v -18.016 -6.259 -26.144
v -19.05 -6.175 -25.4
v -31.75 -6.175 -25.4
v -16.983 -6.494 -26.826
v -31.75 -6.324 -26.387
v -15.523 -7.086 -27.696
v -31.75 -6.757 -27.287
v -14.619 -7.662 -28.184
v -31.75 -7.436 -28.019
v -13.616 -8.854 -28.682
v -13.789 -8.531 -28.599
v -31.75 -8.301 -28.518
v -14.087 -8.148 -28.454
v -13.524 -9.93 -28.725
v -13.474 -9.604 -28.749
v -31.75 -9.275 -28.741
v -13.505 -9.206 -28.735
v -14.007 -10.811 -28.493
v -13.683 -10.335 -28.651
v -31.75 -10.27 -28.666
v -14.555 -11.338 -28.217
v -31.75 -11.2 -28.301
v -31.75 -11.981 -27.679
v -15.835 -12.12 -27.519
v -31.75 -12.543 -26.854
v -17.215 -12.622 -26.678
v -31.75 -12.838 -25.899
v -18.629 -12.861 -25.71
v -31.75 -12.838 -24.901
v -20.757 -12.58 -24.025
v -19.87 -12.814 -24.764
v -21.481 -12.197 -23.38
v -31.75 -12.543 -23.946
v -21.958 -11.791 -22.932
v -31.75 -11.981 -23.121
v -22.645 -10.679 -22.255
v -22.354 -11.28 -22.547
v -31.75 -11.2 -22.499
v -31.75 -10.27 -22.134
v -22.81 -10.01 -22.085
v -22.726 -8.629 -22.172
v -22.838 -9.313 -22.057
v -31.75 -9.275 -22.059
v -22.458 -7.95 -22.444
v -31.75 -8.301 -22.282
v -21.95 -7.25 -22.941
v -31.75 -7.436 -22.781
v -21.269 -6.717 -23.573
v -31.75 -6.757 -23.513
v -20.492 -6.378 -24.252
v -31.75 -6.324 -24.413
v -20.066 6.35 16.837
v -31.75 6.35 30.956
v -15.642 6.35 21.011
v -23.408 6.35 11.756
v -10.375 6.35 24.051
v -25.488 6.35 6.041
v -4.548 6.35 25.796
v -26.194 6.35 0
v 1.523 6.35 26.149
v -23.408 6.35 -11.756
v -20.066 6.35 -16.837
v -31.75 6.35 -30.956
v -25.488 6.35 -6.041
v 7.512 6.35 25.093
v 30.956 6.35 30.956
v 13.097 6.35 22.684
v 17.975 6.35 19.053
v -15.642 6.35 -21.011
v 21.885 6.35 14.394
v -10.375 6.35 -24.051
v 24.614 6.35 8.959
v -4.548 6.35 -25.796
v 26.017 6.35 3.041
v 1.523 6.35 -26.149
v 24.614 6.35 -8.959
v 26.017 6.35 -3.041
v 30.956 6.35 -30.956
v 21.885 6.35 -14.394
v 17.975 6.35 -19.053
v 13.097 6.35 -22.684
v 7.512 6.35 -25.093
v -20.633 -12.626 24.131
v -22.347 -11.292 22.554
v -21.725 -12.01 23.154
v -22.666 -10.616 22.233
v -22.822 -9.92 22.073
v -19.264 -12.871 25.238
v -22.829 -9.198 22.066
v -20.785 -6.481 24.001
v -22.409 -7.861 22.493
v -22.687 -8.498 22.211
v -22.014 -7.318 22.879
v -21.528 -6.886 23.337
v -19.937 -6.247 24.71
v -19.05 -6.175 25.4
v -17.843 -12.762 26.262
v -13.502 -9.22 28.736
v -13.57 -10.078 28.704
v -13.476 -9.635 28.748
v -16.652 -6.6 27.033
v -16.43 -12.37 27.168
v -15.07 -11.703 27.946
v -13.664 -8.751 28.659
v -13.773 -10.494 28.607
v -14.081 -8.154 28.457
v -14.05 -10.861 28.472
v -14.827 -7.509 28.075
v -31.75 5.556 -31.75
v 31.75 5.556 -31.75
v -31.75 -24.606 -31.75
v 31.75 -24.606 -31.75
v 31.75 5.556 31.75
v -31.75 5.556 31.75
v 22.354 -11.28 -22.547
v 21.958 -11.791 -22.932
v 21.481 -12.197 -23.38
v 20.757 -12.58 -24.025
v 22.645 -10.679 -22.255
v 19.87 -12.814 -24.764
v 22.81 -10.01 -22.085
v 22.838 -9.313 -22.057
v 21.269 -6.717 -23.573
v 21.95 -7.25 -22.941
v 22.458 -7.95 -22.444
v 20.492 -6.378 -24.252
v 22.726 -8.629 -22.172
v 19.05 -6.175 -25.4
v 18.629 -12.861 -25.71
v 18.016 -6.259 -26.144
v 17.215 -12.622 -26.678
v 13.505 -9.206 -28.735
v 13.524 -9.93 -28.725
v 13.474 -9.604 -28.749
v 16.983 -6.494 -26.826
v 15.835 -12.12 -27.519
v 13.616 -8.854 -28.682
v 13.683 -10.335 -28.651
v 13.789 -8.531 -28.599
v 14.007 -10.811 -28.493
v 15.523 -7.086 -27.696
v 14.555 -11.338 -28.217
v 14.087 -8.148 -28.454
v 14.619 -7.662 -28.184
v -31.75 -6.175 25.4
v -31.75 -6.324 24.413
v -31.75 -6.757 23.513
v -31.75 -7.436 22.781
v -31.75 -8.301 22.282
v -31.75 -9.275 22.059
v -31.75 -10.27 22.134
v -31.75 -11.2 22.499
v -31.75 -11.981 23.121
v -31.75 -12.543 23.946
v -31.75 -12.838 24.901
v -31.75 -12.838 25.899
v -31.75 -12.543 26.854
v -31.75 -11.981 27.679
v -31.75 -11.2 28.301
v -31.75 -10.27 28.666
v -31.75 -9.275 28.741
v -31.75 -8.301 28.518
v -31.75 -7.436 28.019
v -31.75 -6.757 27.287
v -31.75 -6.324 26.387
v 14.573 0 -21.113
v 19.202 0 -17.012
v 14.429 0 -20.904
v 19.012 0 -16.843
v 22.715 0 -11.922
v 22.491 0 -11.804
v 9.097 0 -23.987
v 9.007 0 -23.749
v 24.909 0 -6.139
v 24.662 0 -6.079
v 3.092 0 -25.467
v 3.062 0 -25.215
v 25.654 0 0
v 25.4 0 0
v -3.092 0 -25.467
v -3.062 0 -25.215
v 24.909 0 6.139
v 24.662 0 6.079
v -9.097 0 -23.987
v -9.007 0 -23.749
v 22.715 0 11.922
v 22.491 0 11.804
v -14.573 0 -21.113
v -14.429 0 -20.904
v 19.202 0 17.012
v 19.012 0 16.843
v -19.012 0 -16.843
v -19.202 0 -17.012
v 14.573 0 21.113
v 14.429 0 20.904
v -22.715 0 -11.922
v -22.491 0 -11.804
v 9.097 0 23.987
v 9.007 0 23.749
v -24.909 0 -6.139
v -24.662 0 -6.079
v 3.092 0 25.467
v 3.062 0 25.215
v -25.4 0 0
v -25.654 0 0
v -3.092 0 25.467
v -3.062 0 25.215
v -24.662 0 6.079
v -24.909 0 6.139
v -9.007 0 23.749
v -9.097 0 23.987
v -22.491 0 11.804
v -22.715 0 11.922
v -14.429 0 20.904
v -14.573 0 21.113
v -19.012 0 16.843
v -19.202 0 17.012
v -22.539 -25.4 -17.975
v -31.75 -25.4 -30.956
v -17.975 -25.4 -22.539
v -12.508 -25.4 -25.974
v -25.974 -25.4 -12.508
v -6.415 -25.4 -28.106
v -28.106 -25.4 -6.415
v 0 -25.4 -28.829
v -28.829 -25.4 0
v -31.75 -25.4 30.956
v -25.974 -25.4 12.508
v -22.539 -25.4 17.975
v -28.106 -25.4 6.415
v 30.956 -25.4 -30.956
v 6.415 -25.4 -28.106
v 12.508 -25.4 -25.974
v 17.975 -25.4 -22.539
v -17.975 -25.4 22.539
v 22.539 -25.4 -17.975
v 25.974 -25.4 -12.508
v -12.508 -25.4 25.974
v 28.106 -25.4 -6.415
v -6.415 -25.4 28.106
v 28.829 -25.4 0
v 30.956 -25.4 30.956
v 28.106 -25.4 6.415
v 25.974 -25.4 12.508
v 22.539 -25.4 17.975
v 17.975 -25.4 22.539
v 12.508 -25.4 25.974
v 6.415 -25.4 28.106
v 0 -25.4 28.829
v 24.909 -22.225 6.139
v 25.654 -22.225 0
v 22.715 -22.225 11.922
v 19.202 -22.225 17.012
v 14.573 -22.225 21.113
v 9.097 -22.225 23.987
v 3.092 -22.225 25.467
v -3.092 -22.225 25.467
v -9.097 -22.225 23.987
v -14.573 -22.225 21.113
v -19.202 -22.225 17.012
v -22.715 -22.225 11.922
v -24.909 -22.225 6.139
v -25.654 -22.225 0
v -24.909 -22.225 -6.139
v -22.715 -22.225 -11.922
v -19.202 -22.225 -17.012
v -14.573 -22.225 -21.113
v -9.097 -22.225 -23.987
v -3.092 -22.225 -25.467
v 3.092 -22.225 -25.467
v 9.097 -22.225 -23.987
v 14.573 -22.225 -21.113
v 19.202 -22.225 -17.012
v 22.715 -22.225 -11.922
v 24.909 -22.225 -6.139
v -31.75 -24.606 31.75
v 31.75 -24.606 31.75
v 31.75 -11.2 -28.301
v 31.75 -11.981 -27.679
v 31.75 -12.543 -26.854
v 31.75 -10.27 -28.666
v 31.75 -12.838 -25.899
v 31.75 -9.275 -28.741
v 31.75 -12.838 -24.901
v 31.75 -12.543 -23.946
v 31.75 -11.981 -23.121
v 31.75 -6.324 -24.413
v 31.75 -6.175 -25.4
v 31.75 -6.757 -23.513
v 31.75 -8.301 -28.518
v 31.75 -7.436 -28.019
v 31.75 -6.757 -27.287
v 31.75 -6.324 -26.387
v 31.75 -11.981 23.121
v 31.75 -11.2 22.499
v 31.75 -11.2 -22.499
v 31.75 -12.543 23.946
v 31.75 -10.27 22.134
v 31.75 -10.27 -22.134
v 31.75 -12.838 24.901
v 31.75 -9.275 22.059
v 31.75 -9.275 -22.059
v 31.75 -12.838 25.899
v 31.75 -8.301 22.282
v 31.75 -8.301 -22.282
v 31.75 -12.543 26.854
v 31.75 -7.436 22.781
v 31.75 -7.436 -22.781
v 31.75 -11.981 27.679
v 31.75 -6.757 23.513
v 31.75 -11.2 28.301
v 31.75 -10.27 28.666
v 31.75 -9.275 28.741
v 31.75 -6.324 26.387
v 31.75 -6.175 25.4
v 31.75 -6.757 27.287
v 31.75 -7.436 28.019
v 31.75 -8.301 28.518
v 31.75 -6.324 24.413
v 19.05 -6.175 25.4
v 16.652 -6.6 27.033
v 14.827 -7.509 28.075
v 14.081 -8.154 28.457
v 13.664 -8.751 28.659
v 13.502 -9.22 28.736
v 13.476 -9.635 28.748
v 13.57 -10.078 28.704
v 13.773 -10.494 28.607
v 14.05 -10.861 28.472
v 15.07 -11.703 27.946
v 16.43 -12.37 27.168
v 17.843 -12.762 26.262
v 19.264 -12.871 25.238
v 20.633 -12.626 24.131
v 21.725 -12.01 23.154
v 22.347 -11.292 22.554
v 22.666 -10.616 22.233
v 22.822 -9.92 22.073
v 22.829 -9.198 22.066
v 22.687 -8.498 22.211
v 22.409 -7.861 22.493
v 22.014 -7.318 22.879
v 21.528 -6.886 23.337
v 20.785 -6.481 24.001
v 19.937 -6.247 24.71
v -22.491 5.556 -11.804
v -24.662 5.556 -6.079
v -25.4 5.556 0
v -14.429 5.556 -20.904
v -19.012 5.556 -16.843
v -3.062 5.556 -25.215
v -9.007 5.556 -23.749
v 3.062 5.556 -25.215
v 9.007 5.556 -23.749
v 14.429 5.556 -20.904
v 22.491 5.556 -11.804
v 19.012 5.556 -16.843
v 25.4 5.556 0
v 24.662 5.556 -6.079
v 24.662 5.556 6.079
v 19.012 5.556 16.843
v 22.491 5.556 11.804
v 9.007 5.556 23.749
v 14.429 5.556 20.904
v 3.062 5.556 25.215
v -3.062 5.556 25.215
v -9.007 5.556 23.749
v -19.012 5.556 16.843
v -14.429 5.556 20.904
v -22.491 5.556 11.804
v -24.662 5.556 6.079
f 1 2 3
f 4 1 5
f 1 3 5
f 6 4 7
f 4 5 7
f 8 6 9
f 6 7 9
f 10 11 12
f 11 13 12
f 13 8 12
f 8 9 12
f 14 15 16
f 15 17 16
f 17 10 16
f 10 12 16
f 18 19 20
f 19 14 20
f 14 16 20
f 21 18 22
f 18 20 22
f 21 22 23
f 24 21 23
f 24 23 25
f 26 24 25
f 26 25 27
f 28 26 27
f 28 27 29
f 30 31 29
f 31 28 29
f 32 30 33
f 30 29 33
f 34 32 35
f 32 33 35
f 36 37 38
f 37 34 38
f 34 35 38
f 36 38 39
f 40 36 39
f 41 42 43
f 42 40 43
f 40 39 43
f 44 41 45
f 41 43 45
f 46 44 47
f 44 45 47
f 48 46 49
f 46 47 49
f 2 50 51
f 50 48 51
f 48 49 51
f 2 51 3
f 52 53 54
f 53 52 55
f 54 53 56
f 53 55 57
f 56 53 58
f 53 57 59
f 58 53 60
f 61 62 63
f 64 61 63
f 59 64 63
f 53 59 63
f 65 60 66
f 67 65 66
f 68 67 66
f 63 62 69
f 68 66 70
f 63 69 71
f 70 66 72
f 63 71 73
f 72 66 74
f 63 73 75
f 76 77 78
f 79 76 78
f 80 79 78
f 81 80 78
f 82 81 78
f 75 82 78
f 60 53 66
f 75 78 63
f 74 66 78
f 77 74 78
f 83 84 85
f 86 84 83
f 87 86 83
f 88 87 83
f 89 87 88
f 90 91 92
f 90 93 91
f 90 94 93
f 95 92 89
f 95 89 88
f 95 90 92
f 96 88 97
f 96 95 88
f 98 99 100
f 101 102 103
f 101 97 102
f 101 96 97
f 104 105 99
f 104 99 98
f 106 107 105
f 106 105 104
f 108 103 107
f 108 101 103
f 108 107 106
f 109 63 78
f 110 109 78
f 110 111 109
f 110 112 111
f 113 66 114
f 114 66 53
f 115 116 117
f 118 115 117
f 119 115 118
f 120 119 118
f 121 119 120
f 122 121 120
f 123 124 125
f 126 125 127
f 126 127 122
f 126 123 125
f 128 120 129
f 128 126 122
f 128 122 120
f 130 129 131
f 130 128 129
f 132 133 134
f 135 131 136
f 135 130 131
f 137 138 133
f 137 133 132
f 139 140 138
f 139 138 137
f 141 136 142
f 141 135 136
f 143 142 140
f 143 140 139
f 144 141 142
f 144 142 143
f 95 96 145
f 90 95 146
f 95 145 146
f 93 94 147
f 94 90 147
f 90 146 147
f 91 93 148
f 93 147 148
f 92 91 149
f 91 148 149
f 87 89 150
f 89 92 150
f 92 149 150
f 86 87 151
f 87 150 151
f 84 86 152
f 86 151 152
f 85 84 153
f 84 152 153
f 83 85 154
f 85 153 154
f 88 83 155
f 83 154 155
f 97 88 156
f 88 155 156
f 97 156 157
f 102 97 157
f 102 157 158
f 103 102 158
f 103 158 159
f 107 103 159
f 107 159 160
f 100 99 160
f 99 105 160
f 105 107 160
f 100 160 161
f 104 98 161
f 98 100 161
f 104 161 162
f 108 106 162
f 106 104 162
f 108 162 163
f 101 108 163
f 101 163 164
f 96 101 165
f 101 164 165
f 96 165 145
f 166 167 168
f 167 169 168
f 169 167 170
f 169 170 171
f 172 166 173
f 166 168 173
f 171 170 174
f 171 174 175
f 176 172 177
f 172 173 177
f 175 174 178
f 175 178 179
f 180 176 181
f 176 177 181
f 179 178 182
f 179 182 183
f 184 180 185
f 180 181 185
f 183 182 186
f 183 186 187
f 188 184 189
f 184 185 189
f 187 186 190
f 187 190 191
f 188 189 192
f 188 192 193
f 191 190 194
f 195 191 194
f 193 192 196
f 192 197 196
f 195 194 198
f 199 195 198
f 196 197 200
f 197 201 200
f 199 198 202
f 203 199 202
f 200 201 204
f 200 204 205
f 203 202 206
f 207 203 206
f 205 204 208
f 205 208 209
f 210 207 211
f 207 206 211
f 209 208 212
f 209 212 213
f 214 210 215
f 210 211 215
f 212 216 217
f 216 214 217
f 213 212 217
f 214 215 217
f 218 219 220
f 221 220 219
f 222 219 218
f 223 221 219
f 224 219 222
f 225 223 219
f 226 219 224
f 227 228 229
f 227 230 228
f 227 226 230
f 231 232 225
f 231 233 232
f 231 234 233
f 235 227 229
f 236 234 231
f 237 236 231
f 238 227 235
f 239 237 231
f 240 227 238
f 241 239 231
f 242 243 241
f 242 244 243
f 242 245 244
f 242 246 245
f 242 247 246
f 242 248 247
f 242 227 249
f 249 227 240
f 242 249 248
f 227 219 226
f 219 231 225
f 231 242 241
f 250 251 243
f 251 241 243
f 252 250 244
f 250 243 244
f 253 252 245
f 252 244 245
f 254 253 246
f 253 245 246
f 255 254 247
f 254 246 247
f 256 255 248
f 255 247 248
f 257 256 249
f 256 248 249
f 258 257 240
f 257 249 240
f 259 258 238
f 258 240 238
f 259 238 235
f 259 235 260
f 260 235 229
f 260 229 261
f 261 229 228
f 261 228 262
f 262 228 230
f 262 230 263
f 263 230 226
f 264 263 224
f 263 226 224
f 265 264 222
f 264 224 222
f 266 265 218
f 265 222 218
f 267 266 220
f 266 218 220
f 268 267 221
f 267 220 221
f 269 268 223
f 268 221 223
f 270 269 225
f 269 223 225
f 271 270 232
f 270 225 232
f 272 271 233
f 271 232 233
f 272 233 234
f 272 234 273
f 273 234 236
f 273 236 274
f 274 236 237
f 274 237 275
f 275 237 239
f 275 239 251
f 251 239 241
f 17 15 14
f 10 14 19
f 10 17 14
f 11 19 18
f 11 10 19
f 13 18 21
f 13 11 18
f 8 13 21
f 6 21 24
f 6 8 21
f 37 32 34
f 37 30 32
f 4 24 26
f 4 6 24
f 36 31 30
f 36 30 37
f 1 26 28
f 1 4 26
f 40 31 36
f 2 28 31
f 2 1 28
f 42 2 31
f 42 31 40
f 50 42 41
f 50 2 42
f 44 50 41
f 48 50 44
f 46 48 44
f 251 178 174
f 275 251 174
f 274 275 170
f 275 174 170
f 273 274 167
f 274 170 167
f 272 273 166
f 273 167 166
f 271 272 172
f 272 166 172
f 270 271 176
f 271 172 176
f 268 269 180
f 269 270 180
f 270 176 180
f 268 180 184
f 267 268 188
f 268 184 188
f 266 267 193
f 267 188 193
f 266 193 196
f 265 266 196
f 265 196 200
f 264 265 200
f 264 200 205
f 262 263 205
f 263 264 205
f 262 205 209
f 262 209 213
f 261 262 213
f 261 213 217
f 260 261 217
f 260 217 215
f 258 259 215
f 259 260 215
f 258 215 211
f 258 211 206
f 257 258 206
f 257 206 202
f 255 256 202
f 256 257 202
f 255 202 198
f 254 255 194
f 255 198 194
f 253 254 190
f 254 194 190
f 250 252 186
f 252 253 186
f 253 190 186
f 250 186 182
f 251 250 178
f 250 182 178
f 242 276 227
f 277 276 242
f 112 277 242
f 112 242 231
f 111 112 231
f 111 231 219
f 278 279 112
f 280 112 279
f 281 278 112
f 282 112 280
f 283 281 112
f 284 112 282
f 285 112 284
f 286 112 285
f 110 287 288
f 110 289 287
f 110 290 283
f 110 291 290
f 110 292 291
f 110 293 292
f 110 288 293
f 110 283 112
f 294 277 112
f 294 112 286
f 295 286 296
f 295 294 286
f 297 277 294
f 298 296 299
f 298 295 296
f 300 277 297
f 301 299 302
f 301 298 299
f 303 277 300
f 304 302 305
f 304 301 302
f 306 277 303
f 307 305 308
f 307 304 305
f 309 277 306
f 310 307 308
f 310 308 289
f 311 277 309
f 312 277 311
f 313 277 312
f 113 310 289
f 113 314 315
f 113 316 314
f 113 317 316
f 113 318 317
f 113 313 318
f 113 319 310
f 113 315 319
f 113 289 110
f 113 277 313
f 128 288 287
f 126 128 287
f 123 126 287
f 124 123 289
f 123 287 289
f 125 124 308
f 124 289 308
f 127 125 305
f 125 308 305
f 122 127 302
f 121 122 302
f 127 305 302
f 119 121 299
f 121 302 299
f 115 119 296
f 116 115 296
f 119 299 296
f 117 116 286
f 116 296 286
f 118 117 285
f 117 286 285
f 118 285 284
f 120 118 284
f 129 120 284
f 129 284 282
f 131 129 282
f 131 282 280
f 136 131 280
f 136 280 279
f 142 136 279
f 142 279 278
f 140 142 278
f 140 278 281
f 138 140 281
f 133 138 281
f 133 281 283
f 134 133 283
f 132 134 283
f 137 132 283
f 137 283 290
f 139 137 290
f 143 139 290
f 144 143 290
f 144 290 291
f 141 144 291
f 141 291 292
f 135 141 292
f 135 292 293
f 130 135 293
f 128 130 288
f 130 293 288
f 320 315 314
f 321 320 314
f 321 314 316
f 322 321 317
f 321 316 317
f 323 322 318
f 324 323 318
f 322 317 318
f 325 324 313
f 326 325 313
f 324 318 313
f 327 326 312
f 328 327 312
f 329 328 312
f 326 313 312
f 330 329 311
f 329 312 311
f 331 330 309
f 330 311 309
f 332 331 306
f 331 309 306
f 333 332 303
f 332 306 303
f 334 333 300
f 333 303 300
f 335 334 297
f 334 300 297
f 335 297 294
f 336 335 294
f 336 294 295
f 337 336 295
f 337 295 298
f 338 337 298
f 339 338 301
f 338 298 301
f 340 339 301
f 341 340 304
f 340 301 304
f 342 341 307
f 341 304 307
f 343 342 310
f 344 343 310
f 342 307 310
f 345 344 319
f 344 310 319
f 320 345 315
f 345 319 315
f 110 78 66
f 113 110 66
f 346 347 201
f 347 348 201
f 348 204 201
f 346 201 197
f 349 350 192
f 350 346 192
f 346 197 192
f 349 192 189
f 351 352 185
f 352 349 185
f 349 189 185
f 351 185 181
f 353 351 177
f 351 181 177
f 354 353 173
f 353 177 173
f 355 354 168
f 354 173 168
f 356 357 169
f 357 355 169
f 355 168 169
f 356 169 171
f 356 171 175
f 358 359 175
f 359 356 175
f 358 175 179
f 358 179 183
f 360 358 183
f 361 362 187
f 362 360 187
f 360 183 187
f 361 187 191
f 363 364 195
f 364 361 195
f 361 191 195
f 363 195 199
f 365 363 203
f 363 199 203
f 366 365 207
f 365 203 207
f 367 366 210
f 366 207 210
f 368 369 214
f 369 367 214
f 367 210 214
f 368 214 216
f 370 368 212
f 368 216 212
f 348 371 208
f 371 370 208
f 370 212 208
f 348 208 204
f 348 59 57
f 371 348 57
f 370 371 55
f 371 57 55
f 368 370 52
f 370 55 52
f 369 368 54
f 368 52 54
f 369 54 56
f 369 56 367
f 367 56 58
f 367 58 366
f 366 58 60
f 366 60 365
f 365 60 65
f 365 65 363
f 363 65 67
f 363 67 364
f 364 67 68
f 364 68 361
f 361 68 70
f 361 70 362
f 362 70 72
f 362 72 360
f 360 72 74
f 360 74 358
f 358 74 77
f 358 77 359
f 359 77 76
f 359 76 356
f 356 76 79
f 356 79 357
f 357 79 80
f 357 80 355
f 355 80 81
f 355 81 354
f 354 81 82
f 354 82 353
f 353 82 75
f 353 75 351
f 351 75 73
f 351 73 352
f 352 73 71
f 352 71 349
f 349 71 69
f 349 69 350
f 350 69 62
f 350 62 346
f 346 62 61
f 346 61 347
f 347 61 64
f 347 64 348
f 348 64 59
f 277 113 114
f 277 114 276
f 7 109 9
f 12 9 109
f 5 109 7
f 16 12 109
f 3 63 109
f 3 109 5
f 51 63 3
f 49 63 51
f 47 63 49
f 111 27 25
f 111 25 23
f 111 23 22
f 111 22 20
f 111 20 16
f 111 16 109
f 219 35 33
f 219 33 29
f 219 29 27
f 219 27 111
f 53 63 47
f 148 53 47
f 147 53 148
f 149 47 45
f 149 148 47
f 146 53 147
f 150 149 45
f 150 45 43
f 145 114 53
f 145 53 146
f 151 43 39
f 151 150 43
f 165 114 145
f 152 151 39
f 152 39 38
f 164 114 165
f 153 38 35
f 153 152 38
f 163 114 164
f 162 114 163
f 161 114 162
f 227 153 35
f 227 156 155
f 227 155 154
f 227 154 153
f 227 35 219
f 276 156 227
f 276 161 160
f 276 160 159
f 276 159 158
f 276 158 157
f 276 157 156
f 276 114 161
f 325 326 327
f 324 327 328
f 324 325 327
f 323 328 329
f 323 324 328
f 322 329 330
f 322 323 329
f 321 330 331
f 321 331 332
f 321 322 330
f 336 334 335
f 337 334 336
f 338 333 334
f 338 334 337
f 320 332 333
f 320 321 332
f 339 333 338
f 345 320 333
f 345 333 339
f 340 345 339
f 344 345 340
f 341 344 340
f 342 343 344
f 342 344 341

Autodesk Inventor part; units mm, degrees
ref_plane "XZ Plane" through (0, 0, 0) normal (0, 1, 0) x (-1, 0, 0)
ref_plane "XY Plane" through (0, 0, 0) normal (0, 0, 1) x (1, 0, 0)
sketch "Sketch1" plane through (0, 0, 0) normal (0, 1, 0) x (-1, 0, 0)
  circle A0 centre (0, 0) radius 25.4
  circle A1 centre (0, 0) radius 31.75
  dimension "d0" = 50.8
  dimension "d1" = 63.5
extrude "Extrusion1" add sketch "Sketch1" along normal blind 6.35
sketch "Sketch2" plane through (0, 0, 0) normal (0, -1, 0) x (1, 0, 0)
  circle A0 centre (0, 0) radius 25.654
  circle A1 centre (0, 0) radius 31.75 projected
  dimension "d4" = 51.308
extrude "Extrusion2" add sketch "Sketch2" along normal blind 25.4
chamfer "Chamfer1" distance 3.175 angle 45 1 edges at (-25.654, -25.4, 0)
ref_plane "Work Plane1" through (31.75, 0, 0) normal (1, 0, 0) x (0, 1, 0)
sketch "Sketch5" plane through (31.75, 0, 0) normal (1, 0, 0) x (0, 1, 0)
  line L0 (6.35, 31.75) -> (-25.4, 31.75)
  line L1 (-25.4, -31.75) -> (6.35, -31.75)
  line L2 (6.35, 31.75) -> (-25.4, -31.75) construction
  line L3 (-25.4, 31.75) -> (6.35, -31.75) construction
  line L4 (0, 25.654) -> (0, -25.654) construction
  circle A0 centre (-9.525, 25.4) radius 3.35
  circle A1 centre (-9.525, -25.4) radius 3.35
  line L5 (-9.525, 25.4) -> (-9.525, -25.4) construction
  line L6 (6.35, 31.75) -> (6.35, -31.75)
  line L7 (-25.4, 31.75) -> (-25.4, -31.75)
  point P0 (0, 0)
  point P1 (6.35, 0)
  point P2 (-9.525, 0)
  dimension "d27" = 63.5
  dimension "d28" = 50.8
  dimension "d29" = 6.7
extrude "Extrusion4" add sketch "Sketch5" against normal up to surface
mirror "Mirror1" about plane through (0, 0, 0) normal (1, 0, 0) of "Extrusion4"
chamfer "Chamfer3" distance 0.7937 angle 45 7 edges at (0, 6.35, 31.75) (0, 6.35, -31.75) (25.4, 6.35, 0) (31.75, 6.35, 0) (31.75, -25.4, 0) (0, -25.4, -31.75) (0, -25.4, 31.75)
properties part number "WL-002" material "Aluminum 6061"
